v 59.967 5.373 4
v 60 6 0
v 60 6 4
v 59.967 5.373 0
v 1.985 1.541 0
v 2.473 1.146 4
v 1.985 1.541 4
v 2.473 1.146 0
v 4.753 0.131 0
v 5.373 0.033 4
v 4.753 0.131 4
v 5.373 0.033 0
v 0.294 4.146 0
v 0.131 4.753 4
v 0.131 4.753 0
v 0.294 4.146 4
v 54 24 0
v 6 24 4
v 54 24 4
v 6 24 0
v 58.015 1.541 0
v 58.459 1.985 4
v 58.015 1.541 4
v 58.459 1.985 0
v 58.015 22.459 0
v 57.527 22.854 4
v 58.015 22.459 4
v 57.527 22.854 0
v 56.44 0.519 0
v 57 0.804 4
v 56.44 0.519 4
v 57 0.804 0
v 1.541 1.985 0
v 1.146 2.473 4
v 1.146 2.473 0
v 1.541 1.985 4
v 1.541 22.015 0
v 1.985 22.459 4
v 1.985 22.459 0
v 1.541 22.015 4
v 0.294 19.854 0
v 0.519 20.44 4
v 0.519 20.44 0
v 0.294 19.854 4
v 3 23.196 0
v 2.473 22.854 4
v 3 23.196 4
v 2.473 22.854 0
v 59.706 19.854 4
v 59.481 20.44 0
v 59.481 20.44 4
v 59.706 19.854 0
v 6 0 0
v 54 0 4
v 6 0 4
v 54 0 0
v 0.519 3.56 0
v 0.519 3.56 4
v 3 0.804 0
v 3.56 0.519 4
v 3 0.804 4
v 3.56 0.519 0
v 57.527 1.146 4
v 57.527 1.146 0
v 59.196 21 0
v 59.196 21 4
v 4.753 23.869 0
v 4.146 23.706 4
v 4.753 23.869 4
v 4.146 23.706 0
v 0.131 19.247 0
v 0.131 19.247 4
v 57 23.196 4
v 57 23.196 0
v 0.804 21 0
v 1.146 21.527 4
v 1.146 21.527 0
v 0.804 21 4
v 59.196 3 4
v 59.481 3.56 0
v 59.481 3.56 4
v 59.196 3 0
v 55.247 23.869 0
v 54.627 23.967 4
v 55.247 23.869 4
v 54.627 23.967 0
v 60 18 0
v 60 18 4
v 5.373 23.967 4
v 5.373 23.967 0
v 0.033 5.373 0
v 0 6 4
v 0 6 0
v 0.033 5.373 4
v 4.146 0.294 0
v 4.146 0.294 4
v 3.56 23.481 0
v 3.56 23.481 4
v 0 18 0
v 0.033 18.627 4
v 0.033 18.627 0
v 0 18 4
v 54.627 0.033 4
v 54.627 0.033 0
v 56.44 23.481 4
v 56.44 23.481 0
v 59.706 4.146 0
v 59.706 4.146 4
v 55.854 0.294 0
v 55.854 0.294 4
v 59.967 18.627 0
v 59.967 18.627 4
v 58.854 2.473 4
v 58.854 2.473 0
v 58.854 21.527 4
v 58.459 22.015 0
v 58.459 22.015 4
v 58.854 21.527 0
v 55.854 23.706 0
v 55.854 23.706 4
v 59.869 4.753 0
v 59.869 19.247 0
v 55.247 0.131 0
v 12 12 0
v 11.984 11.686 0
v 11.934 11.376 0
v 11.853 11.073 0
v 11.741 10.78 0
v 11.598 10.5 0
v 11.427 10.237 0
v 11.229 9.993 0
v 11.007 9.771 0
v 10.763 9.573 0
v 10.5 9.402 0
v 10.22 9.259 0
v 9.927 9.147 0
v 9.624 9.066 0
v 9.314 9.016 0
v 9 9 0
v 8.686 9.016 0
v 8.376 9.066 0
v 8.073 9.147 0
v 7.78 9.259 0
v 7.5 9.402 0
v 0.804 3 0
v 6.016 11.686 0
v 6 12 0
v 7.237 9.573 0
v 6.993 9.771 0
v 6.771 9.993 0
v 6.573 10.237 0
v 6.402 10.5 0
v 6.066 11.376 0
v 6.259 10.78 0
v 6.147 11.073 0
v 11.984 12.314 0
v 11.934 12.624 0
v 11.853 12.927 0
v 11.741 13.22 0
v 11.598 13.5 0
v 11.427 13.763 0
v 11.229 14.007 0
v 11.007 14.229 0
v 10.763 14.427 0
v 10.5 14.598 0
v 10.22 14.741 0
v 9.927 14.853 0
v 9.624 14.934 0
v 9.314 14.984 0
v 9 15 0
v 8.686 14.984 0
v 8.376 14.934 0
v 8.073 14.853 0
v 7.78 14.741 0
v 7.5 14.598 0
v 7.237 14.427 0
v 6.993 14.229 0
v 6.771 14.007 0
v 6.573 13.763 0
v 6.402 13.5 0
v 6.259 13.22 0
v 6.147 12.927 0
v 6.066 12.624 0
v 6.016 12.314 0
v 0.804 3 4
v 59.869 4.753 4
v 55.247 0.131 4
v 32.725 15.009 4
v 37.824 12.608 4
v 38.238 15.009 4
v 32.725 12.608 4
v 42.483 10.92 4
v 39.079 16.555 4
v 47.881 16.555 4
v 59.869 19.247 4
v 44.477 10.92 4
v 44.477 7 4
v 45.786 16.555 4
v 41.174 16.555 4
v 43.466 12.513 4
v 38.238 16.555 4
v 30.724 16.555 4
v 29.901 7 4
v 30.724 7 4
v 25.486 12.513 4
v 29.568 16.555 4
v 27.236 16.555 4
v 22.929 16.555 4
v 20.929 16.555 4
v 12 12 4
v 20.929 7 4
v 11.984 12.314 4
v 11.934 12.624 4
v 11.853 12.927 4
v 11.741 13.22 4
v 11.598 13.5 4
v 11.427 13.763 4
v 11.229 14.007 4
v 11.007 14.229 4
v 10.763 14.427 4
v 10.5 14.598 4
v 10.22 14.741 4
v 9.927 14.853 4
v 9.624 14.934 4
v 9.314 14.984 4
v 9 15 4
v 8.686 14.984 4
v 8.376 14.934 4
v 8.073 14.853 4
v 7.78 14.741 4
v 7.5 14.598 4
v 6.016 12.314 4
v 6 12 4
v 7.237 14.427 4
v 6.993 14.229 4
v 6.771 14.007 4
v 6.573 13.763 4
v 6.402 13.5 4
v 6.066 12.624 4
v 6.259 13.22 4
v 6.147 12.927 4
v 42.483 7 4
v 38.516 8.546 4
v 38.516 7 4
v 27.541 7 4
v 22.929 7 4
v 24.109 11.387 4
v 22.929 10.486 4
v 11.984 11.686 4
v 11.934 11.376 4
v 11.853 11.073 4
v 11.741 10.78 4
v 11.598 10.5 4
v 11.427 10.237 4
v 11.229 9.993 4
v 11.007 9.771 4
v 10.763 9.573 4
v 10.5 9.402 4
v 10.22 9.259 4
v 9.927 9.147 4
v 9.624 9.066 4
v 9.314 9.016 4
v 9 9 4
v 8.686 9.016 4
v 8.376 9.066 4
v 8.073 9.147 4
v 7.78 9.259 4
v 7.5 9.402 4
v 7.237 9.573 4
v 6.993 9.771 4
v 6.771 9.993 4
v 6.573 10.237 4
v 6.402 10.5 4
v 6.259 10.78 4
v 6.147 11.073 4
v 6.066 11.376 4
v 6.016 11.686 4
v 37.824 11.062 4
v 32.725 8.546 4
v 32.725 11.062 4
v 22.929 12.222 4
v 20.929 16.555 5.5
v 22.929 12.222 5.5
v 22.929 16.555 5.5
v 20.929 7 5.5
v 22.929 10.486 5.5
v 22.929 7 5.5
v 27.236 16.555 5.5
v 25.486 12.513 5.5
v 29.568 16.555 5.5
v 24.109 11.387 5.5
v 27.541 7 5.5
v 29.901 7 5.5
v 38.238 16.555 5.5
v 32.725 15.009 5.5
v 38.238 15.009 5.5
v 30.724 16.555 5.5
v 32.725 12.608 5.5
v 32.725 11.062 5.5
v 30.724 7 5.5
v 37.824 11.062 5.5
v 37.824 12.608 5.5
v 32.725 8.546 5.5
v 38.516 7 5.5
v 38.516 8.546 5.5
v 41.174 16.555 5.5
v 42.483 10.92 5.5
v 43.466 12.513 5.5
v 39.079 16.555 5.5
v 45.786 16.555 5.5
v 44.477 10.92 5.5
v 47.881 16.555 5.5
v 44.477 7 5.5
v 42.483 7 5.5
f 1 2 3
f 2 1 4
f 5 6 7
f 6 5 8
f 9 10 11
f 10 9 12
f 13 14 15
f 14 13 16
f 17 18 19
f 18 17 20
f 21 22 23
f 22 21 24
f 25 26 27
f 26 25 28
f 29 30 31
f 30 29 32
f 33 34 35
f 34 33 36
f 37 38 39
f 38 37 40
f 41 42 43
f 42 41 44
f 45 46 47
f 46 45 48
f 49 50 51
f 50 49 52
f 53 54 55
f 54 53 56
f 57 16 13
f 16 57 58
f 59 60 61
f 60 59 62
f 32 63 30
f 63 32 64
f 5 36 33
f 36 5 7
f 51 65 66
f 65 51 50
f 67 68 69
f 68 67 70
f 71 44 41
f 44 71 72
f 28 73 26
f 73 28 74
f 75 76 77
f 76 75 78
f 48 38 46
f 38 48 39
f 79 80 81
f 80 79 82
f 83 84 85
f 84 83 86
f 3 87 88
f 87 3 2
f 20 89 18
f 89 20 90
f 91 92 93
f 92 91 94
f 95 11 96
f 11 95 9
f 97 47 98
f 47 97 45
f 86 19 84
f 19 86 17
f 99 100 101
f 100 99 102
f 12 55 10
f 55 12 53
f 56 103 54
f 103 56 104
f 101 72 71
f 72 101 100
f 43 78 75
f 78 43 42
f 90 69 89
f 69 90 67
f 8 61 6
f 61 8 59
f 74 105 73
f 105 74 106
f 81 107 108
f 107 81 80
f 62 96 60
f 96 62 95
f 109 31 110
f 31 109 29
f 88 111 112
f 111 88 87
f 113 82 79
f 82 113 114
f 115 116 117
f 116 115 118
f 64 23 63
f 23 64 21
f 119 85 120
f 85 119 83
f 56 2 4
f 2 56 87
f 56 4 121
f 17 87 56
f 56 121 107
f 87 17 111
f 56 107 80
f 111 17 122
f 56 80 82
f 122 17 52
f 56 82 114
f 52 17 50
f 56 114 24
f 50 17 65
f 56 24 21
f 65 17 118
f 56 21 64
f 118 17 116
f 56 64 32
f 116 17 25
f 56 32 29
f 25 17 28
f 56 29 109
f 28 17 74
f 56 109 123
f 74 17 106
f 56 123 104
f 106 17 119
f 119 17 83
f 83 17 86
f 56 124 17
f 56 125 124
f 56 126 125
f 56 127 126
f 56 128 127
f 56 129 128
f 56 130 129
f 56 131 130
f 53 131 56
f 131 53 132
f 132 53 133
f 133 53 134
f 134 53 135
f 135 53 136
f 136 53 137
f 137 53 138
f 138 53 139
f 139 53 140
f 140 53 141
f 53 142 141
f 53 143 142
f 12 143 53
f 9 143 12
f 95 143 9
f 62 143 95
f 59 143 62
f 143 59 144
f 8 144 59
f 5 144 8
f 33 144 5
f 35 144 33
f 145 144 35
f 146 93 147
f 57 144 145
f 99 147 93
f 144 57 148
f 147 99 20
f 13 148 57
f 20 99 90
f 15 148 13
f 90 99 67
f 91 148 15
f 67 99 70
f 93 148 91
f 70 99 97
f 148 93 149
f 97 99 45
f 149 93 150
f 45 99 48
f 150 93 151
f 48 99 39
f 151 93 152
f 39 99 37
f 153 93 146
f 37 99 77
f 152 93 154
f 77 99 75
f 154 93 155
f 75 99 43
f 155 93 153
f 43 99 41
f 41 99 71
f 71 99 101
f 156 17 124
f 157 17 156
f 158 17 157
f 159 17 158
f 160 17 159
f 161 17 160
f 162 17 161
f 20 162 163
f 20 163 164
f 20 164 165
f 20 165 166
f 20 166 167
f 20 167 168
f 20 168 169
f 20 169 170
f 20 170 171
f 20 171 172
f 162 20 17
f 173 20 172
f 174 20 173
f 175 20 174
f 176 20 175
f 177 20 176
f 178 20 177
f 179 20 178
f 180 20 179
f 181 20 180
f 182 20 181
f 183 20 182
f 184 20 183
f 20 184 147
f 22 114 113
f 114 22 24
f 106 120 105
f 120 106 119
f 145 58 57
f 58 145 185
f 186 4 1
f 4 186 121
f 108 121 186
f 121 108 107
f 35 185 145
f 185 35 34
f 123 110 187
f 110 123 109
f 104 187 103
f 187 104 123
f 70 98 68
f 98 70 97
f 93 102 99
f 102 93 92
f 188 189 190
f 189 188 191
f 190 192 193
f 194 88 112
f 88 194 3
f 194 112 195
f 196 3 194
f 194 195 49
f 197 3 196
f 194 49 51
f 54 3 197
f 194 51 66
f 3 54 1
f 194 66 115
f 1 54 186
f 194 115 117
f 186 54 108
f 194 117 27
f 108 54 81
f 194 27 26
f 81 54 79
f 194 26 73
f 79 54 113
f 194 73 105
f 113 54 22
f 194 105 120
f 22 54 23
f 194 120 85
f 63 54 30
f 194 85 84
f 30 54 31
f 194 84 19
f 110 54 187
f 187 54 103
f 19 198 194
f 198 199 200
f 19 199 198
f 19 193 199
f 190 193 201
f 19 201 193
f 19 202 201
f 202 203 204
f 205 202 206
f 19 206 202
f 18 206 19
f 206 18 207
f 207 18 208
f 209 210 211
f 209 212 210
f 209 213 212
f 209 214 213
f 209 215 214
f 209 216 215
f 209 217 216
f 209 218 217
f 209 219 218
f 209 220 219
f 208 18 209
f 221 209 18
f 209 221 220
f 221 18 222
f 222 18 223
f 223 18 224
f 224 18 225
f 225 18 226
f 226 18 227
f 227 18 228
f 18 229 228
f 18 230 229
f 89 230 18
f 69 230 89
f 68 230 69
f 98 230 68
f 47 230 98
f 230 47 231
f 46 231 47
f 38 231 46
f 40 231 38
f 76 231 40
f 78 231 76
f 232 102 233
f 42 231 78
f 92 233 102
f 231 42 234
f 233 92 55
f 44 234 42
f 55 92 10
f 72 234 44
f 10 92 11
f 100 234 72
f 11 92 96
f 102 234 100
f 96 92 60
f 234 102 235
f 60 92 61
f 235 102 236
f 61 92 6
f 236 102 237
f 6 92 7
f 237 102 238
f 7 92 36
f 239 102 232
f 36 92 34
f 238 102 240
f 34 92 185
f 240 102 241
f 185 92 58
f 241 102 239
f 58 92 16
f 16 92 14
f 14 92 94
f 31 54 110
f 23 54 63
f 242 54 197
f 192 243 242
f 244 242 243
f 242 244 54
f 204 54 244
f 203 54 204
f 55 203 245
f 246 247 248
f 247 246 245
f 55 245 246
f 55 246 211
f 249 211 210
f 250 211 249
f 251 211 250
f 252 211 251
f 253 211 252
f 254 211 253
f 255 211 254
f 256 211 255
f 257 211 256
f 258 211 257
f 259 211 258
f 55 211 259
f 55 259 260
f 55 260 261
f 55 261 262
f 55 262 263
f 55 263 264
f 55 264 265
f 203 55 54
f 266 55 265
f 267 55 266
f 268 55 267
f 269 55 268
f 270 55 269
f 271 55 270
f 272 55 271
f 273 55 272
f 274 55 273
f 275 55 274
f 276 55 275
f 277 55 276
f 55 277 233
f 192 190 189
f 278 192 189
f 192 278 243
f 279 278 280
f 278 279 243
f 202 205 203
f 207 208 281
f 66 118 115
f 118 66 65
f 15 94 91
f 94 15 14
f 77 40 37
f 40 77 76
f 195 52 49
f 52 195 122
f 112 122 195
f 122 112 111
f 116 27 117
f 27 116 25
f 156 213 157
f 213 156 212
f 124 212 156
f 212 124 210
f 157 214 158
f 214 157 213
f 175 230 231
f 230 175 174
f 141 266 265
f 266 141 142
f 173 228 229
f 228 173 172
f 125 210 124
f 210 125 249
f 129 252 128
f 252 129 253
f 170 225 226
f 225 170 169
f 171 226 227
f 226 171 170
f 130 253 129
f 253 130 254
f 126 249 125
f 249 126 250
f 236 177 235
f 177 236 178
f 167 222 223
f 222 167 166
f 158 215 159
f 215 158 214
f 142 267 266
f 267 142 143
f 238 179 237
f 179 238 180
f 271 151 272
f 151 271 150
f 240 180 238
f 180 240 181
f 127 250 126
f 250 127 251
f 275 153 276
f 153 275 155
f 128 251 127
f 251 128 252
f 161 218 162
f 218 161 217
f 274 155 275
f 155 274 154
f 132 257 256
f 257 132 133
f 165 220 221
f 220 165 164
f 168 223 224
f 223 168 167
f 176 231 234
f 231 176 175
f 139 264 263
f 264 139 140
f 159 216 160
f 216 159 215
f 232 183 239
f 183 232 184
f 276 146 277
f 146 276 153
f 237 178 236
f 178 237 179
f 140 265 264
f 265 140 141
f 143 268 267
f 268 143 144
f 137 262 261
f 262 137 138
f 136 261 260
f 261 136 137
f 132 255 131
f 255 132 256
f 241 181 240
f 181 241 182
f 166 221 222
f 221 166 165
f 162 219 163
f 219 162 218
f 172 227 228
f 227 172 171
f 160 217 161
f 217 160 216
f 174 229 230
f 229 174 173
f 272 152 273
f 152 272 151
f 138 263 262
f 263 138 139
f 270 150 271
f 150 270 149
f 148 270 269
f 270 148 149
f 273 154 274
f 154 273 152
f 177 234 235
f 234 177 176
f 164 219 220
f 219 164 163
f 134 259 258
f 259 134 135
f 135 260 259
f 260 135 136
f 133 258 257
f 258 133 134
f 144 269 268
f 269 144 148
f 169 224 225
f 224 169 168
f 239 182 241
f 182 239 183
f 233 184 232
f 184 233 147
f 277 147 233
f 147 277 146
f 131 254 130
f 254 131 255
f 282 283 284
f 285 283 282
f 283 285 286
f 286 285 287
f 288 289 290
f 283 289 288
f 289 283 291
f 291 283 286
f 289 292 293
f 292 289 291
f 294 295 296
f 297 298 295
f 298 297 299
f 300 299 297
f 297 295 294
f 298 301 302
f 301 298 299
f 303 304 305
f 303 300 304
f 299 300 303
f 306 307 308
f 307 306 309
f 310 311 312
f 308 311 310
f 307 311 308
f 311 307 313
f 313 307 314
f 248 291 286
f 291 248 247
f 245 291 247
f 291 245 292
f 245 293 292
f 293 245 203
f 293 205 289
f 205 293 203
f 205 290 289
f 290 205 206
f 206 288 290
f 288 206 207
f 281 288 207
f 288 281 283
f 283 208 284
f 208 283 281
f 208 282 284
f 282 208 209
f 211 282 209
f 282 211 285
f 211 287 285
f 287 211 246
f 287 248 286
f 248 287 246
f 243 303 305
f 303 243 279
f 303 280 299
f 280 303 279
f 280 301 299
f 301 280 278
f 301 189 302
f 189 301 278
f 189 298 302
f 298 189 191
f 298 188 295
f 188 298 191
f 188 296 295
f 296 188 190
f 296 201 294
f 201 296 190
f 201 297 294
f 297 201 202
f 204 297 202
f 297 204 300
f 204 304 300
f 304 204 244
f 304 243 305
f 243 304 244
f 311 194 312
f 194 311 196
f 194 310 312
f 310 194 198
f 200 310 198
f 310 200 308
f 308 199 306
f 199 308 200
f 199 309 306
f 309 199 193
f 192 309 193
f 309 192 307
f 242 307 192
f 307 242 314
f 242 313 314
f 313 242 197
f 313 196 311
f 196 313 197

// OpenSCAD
// ===== 例題6: キーホルダー =====
// 角丸プレート＋ひも穴＋文字。hull()で角を丸めます。

tag_w = 60;   // よこ(mm)
tag_d = 24;   // たて(mm)
tag_h = 4;    // あつさ(mm)
r     = 6;    // 角の丸み(mm)
$fn   = 60;

difference() {
  // 角丸プレート：4すみに円柱を置いてhull()で包む
  hull() {
    translate([r,       r,       0]) cylinder(r=r, h=tag_h);
    translate([tag_w-r, r,       0]) cylinder(r=r, h=tag_h);
    translate([r,       tag_d-r, 0]) cylinder(r=r, h=tag_h);
    translate([tag_w-r, tag_d-r, 0]) cylinder(r=r, h=tag_h);
  }
  // ひもを通す穴
  translate([9, tag_d/2, -1]) cylinder(r=3, h=tag_h+2);
}

// 文字を乗せる
translate([20, 7, tag_h])
  linear_extrude(height = 1.5)
    text("KEY", size = 10, font = "Liberation Sans:style=Bold");
